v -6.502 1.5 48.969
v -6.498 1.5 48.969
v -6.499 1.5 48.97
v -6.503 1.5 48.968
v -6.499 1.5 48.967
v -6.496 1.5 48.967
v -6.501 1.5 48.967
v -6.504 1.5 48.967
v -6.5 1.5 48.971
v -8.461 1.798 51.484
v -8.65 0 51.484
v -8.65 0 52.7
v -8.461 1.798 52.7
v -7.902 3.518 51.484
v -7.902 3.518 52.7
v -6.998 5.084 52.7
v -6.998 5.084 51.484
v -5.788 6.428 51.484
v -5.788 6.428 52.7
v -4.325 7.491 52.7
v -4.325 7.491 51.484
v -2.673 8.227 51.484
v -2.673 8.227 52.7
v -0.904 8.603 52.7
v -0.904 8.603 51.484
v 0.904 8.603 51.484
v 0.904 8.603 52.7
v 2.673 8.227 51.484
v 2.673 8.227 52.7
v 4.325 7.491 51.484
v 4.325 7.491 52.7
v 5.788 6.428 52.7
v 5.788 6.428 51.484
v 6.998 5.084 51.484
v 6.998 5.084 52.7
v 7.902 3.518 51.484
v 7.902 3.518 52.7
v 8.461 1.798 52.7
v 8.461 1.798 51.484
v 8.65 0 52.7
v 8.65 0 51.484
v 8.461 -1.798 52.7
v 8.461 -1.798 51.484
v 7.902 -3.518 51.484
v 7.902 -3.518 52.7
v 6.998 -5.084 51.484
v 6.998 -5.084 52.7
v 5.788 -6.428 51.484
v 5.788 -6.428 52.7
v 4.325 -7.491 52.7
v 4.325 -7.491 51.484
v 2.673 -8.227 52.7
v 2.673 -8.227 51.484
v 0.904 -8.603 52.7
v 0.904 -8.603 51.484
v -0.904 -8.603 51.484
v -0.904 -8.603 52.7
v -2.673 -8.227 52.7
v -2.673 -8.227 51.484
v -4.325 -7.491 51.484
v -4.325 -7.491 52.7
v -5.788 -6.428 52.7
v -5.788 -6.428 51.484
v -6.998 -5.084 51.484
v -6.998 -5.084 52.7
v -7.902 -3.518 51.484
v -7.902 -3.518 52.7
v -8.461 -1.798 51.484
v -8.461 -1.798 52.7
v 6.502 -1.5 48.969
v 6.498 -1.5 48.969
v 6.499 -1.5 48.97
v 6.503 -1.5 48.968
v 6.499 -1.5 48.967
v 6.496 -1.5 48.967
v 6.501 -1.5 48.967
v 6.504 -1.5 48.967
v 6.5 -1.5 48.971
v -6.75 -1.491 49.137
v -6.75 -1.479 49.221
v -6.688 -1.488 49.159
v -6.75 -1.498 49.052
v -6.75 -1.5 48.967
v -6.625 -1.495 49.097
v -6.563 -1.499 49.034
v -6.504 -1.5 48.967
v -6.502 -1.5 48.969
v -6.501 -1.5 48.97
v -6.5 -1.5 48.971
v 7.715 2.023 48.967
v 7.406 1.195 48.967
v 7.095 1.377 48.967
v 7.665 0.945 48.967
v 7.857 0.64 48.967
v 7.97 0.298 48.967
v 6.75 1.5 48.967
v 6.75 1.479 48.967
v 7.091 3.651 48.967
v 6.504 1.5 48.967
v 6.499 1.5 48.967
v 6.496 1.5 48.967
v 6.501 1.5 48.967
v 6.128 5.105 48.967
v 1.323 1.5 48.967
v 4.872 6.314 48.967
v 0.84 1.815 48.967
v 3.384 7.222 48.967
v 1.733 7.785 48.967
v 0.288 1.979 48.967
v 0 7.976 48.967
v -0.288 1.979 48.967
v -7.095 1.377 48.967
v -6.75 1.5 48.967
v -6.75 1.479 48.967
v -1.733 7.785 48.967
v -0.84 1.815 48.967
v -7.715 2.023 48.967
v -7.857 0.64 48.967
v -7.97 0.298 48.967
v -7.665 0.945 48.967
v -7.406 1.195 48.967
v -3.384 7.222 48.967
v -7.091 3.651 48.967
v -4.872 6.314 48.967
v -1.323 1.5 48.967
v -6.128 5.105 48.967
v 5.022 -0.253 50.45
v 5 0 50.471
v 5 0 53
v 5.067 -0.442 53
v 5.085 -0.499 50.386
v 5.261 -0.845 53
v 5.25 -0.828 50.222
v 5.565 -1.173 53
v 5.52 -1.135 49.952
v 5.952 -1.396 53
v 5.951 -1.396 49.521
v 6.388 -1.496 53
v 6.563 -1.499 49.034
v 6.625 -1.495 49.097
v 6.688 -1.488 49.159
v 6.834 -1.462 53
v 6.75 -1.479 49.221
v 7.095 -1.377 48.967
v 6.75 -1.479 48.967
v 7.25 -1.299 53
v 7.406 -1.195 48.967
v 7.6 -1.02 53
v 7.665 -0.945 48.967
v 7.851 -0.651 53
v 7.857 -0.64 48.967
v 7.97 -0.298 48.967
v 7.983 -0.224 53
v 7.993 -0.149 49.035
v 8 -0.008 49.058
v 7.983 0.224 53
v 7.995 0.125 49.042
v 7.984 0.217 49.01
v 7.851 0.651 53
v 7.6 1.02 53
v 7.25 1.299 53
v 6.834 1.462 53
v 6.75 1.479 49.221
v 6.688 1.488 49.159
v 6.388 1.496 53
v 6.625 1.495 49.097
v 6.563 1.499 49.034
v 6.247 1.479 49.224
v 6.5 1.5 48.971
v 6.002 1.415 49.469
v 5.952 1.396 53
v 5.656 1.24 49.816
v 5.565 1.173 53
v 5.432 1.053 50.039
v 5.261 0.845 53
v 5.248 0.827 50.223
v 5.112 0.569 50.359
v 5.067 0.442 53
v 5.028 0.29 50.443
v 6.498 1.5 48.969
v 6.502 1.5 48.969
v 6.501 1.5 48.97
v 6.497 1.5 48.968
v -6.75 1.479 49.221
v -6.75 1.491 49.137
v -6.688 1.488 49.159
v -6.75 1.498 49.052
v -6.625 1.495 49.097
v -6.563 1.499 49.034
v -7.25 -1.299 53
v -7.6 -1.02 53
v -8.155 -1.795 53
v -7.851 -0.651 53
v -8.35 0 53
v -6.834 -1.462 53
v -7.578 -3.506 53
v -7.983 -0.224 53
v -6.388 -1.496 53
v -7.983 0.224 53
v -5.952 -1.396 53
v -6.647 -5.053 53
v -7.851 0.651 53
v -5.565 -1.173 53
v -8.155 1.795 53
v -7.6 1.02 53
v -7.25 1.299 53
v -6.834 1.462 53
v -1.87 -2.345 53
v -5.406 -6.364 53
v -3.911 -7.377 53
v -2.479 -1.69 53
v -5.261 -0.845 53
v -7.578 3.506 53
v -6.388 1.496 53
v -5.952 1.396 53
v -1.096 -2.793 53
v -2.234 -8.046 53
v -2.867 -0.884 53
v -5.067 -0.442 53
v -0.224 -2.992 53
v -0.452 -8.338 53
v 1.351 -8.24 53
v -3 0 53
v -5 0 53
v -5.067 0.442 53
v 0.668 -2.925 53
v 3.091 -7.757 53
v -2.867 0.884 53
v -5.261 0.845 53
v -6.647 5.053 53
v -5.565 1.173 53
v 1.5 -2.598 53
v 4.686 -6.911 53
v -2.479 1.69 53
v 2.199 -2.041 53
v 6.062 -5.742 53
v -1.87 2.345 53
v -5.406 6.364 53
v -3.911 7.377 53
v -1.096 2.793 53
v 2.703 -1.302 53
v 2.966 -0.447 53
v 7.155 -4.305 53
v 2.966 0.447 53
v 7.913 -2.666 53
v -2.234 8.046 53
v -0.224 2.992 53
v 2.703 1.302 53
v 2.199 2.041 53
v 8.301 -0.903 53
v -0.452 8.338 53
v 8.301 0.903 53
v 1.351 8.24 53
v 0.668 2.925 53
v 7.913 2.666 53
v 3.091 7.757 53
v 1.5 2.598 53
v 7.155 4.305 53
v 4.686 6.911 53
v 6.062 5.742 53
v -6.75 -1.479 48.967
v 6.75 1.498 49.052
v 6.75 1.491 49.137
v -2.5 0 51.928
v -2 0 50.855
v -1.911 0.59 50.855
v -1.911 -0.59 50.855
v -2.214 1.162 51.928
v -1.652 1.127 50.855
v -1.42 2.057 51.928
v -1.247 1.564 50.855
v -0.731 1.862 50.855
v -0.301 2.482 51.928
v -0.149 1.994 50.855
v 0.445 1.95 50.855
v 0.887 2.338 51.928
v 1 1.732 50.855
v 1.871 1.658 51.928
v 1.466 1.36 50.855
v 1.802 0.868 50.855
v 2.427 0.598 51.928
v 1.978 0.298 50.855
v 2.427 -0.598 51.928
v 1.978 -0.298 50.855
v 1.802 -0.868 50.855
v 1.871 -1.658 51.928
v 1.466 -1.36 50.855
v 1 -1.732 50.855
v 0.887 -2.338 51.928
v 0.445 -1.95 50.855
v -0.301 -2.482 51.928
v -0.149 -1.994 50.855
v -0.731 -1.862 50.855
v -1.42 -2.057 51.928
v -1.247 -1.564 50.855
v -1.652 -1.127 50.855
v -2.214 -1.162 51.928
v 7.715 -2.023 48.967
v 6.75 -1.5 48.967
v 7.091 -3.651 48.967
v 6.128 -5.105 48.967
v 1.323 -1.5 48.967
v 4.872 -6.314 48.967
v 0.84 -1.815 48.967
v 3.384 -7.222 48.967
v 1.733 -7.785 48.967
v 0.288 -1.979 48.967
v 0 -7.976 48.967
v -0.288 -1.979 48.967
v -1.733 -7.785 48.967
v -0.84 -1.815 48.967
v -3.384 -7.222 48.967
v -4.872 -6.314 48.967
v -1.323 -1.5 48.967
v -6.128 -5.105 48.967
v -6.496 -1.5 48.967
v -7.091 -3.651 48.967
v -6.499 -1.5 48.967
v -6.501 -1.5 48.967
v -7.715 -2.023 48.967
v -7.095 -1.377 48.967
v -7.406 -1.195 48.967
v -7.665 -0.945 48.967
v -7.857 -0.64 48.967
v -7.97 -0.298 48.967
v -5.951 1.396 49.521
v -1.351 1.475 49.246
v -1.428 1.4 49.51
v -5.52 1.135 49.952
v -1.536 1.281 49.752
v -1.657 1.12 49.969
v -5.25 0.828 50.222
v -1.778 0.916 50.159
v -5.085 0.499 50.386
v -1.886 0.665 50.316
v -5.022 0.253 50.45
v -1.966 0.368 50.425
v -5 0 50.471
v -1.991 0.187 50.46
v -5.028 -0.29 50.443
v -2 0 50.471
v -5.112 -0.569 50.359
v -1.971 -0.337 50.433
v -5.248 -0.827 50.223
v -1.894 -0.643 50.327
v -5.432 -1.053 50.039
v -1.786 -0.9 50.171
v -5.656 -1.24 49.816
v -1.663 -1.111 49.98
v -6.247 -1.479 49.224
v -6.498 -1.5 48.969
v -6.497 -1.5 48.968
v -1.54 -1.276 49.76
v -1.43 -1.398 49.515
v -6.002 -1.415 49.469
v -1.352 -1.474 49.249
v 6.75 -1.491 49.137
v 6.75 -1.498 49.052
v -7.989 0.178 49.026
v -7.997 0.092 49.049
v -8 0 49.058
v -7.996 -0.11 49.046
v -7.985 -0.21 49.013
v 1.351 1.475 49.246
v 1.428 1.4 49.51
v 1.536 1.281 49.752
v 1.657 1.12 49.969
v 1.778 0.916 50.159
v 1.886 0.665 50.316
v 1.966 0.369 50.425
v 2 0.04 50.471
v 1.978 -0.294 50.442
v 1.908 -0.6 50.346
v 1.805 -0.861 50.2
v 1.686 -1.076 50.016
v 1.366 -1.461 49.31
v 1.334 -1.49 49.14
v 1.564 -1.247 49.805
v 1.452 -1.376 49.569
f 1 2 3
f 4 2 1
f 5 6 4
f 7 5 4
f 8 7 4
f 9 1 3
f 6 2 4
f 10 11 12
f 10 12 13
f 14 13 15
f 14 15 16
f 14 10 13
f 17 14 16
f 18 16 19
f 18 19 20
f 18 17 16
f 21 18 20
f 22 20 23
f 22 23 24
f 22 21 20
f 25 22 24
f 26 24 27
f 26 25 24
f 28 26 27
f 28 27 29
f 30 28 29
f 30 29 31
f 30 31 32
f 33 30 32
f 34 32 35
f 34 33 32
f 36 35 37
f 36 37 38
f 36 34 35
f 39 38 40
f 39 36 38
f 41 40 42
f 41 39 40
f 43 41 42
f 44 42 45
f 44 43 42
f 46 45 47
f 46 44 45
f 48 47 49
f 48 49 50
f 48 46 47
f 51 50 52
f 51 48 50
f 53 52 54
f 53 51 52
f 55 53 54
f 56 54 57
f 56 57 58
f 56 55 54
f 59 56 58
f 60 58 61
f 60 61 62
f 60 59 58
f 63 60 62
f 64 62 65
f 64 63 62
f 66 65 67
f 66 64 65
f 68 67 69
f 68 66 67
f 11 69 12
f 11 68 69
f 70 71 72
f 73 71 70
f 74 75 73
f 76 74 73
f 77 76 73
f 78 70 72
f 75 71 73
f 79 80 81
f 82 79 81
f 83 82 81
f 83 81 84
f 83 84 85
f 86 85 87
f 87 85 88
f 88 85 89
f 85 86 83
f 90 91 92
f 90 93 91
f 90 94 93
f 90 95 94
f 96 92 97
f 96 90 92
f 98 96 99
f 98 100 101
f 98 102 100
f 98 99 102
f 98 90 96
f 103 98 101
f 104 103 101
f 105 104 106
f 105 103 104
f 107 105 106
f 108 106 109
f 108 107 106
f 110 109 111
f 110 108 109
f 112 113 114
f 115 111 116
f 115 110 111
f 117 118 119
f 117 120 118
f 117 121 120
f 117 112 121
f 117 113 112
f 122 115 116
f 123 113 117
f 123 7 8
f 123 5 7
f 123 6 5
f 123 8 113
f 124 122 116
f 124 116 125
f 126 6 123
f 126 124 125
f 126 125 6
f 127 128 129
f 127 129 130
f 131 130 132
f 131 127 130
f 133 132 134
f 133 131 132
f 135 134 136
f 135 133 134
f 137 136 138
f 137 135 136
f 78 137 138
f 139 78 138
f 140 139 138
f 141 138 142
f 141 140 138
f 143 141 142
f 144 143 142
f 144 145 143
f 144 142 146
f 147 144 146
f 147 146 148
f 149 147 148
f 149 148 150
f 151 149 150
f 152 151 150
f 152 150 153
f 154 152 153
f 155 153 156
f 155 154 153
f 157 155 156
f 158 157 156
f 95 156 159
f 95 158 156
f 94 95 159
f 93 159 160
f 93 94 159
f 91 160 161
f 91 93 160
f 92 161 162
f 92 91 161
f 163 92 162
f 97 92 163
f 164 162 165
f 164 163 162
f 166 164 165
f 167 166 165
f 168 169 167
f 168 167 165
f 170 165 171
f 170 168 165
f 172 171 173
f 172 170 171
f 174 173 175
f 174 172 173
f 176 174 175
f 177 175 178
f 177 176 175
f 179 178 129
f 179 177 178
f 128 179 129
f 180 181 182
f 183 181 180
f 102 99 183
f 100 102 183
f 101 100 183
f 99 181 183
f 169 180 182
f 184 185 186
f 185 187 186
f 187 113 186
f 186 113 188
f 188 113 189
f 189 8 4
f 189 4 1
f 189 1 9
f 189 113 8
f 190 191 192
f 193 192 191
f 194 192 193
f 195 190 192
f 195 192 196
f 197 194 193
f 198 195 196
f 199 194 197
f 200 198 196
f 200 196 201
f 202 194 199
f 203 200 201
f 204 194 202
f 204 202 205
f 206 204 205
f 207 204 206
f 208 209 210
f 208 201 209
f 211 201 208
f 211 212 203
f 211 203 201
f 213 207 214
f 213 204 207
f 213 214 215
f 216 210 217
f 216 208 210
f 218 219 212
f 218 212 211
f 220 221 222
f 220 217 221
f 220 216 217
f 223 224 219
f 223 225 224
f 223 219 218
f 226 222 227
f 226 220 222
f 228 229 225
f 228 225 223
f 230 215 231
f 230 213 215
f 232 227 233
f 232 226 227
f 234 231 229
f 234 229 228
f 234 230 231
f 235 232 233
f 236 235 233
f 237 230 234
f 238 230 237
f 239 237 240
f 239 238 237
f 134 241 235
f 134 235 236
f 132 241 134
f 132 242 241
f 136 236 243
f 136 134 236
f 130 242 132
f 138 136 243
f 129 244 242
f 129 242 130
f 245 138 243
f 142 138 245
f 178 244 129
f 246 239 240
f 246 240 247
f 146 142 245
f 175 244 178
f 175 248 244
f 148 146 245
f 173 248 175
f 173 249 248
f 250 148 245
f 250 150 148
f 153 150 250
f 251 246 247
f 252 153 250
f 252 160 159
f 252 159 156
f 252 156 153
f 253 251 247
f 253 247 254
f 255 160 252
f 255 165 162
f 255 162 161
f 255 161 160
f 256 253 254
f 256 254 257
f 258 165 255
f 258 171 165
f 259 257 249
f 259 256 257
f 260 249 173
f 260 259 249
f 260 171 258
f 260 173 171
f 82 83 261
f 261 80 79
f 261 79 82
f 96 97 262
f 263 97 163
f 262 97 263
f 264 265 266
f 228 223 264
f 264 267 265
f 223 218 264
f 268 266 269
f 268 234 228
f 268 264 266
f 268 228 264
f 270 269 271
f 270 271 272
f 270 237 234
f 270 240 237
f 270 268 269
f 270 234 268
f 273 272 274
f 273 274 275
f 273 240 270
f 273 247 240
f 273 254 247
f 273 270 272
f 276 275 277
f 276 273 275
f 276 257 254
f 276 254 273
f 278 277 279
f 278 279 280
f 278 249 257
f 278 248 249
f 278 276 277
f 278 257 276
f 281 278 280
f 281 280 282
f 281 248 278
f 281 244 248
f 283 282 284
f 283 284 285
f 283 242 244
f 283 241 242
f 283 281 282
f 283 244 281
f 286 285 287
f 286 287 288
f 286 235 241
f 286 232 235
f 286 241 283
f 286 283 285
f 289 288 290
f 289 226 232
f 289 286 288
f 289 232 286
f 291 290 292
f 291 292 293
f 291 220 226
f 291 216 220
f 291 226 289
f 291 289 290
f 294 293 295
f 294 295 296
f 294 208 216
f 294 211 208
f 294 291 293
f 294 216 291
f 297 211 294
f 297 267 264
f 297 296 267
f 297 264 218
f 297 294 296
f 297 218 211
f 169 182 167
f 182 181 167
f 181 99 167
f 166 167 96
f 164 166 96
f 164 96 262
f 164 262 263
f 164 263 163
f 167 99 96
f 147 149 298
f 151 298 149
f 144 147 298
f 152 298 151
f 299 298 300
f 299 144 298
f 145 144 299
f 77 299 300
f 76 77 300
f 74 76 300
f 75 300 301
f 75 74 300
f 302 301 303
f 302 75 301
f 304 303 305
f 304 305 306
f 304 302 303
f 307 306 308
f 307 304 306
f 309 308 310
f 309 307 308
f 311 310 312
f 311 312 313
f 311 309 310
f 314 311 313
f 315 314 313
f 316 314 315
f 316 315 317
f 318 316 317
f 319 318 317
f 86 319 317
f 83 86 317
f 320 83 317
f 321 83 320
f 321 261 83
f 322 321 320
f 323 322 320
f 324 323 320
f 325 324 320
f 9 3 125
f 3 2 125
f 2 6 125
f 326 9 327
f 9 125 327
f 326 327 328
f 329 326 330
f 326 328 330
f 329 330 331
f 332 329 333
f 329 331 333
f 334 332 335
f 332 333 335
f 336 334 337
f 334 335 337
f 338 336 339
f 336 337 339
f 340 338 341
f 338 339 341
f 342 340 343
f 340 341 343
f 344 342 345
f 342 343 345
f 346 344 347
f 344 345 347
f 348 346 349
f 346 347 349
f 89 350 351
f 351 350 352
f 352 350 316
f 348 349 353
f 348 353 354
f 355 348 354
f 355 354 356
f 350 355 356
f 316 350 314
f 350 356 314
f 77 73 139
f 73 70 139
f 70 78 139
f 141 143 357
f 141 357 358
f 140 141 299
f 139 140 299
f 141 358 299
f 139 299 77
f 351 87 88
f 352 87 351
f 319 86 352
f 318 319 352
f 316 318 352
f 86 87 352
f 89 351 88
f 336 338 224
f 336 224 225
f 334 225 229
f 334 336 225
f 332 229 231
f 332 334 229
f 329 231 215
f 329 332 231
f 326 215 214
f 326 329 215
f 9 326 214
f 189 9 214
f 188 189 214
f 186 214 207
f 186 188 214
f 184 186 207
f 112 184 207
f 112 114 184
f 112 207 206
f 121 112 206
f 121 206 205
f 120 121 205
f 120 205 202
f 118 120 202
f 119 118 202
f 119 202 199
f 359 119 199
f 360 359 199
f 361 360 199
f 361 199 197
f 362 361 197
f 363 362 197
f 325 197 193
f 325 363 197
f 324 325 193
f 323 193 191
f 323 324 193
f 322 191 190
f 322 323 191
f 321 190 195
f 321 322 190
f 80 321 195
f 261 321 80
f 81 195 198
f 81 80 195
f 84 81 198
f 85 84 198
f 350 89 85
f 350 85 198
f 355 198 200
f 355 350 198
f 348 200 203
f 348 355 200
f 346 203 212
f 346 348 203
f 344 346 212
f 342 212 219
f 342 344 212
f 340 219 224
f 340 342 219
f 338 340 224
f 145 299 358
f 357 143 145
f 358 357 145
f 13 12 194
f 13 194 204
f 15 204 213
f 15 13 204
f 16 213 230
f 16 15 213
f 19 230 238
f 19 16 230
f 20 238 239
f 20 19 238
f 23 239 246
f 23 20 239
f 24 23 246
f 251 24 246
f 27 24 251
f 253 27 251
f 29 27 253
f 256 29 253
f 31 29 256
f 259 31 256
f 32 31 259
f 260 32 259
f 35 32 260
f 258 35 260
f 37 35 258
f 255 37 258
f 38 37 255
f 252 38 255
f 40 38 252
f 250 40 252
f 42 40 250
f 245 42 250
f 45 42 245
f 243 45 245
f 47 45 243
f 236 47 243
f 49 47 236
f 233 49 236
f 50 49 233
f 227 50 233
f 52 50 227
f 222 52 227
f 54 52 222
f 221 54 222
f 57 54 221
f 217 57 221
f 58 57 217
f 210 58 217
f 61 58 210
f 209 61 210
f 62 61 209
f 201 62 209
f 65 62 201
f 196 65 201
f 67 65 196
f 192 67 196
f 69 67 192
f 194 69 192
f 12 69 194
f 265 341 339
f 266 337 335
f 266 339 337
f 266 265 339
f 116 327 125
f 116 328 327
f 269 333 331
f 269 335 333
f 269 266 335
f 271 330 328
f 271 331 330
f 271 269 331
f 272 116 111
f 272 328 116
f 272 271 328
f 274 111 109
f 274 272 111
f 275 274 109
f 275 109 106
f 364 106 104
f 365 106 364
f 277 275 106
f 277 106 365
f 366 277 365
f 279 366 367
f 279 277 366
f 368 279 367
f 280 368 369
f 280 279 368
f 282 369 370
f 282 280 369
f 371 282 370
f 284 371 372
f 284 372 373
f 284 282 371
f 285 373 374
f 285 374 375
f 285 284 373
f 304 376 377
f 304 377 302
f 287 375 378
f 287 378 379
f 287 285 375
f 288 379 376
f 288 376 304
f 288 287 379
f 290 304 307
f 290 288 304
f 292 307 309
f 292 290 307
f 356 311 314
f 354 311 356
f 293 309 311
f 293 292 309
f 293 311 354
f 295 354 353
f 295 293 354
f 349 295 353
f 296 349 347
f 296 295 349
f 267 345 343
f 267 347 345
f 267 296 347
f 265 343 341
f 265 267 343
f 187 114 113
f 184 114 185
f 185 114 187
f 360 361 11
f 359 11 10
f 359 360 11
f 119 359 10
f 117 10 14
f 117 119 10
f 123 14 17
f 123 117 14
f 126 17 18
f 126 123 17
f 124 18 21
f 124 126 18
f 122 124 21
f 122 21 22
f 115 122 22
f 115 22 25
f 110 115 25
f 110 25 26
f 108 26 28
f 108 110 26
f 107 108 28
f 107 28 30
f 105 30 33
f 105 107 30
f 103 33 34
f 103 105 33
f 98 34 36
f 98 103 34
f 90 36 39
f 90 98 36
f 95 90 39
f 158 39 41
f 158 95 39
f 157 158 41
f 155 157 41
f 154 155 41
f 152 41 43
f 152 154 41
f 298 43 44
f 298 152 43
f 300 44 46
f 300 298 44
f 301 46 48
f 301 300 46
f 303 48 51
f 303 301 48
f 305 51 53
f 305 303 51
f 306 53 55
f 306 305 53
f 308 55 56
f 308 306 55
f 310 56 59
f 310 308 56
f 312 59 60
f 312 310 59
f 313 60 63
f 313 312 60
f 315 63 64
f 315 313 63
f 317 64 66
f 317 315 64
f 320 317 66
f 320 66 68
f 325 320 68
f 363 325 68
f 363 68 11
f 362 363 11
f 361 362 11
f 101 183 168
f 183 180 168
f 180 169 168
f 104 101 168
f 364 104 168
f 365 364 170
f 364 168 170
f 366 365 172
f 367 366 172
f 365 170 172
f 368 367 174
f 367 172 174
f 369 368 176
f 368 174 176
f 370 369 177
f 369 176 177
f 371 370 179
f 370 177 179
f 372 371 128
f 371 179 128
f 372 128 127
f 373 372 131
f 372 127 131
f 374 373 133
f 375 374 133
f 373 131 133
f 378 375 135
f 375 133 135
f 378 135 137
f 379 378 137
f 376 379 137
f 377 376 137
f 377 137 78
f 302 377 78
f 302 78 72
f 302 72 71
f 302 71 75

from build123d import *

# Parameters (mm, degrees)
F2_SIZE  = 0.3
F3_R     = 1.5
F4_DEPTH = 80
F5_R     = 1.5
F6_DEPTH = 6.75


with BuildPart() as f1:
    # F0 (on Front) → F1 (revolve)
    with BuildSketch(Plane.XZ):
        Polygon((-3, 53), (-7.65, 53), (-8.65, 53), (-8.65, 51.483571), (-7.975725, 48.967142), (-2, 48.967142), (-2, 50.855493), align=None)
    revolve(axis=Axis((0, 0, 14.86109), (0, 0, -1)))

    # F2
    f2_edges = [f1.edges().sort_by_distance(p)[0] for p in [
        (8.65, 0, 53),
    ]]
    chamfer(f2_edges, length=F2_SIZE)

    # F3 (on Top) → F4 (cut)
    with BuildSketch(Plane.XY):
        with Locations((-6.5, 0)):
            Circle(F3_R)
        with BuildLine():
            ThreePointArc((8, 0), (6.5, 1.5), (5, 0))
            ThreePointArc((5, 0), (6.5, -1.5), (8, 0))
        make_face()
    extrude(amount=F4_DEPTH, mode=Mode.SUBTRACT)

    # F5 (on Right) → F6 (cut, symmetric)
    with BuildSketch(Plane.YZ):
        with Locations((0, 48.971336)):
            Circle(F5_R)
    extrude(amount=F6_DEPTH, both=True, mode=Mode.SUBTRACT)


solid = f1.part
